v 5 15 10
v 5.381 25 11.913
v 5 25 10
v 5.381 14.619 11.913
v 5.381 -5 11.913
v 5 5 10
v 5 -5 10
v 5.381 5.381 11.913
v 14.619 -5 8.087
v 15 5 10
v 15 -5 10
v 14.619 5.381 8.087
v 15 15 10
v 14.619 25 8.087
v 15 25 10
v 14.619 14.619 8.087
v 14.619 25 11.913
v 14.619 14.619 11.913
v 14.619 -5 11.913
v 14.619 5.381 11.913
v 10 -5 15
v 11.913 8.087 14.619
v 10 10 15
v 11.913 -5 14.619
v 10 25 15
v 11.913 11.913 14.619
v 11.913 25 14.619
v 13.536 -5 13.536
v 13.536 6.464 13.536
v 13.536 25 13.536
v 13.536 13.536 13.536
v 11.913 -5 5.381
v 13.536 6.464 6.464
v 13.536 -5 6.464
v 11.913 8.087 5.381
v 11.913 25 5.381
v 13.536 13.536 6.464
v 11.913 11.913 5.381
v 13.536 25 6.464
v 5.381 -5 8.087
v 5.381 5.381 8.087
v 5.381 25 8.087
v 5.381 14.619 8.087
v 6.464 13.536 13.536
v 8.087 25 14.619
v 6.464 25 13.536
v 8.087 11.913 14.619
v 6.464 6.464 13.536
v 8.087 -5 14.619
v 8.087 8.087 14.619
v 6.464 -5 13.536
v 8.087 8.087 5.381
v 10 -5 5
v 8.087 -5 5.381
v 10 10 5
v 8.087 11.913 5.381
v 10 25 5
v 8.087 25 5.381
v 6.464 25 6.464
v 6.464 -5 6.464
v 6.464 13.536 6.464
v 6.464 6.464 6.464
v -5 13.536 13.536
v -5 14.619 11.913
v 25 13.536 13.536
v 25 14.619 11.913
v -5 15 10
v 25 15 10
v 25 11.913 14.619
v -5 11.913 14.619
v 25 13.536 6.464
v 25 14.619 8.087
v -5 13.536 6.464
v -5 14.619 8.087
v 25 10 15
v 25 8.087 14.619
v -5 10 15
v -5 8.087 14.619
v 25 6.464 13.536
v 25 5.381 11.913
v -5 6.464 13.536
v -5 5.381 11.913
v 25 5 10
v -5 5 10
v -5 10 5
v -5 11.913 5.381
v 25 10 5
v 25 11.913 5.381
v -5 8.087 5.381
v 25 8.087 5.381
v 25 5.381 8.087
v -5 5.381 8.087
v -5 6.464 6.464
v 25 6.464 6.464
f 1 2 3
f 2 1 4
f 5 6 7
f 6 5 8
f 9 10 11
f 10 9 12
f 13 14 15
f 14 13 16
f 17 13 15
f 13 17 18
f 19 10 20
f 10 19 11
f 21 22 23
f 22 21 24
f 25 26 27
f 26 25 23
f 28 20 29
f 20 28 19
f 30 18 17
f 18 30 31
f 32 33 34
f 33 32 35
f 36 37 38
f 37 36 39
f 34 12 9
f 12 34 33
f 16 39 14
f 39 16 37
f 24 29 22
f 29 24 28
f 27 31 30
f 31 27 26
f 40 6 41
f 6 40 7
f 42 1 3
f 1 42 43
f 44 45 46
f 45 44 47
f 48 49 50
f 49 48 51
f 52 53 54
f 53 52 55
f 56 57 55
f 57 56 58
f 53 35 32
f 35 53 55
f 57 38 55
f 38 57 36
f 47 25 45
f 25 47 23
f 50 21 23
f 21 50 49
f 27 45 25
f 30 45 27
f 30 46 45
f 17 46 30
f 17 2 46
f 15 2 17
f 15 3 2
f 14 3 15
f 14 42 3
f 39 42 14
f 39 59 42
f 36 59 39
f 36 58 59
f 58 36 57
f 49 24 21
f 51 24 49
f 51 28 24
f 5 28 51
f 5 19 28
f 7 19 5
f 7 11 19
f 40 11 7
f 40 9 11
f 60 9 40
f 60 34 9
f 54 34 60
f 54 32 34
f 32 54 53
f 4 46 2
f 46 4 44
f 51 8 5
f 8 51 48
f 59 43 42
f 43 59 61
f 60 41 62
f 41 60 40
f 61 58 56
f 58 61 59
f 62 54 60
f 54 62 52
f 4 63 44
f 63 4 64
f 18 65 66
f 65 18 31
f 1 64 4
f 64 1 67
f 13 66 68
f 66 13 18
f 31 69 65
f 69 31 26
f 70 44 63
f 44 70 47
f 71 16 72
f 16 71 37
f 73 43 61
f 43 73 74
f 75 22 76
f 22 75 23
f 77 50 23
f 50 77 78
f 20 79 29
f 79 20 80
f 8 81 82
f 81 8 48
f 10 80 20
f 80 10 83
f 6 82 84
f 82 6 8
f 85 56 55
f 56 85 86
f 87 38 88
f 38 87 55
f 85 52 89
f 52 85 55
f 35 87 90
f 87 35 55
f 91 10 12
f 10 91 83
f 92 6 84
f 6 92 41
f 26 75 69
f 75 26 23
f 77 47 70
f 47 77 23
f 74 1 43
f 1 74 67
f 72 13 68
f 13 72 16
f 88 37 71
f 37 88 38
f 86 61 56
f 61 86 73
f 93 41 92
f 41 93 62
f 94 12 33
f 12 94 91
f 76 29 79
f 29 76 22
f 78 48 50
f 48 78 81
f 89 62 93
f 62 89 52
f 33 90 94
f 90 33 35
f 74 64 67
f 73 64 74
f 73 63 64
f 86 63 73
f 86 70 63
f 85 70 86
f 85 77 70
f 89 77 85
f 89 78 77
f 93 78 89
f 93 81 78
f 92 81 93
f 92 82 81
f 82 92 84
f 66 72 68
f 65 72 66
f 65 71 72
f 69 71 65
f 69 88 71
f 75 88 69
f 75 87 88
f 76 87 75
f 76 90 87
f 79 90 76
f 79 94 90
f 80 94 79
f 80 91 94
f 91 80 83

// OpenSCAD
//cube(20);
translate([10,25,10])rotate([90,0,0])cylinder(r=5,h=30);
translate([-5,10,10])rotate([0,0,90])rotate([90,0,0])cylinder(r=5,h=30);
